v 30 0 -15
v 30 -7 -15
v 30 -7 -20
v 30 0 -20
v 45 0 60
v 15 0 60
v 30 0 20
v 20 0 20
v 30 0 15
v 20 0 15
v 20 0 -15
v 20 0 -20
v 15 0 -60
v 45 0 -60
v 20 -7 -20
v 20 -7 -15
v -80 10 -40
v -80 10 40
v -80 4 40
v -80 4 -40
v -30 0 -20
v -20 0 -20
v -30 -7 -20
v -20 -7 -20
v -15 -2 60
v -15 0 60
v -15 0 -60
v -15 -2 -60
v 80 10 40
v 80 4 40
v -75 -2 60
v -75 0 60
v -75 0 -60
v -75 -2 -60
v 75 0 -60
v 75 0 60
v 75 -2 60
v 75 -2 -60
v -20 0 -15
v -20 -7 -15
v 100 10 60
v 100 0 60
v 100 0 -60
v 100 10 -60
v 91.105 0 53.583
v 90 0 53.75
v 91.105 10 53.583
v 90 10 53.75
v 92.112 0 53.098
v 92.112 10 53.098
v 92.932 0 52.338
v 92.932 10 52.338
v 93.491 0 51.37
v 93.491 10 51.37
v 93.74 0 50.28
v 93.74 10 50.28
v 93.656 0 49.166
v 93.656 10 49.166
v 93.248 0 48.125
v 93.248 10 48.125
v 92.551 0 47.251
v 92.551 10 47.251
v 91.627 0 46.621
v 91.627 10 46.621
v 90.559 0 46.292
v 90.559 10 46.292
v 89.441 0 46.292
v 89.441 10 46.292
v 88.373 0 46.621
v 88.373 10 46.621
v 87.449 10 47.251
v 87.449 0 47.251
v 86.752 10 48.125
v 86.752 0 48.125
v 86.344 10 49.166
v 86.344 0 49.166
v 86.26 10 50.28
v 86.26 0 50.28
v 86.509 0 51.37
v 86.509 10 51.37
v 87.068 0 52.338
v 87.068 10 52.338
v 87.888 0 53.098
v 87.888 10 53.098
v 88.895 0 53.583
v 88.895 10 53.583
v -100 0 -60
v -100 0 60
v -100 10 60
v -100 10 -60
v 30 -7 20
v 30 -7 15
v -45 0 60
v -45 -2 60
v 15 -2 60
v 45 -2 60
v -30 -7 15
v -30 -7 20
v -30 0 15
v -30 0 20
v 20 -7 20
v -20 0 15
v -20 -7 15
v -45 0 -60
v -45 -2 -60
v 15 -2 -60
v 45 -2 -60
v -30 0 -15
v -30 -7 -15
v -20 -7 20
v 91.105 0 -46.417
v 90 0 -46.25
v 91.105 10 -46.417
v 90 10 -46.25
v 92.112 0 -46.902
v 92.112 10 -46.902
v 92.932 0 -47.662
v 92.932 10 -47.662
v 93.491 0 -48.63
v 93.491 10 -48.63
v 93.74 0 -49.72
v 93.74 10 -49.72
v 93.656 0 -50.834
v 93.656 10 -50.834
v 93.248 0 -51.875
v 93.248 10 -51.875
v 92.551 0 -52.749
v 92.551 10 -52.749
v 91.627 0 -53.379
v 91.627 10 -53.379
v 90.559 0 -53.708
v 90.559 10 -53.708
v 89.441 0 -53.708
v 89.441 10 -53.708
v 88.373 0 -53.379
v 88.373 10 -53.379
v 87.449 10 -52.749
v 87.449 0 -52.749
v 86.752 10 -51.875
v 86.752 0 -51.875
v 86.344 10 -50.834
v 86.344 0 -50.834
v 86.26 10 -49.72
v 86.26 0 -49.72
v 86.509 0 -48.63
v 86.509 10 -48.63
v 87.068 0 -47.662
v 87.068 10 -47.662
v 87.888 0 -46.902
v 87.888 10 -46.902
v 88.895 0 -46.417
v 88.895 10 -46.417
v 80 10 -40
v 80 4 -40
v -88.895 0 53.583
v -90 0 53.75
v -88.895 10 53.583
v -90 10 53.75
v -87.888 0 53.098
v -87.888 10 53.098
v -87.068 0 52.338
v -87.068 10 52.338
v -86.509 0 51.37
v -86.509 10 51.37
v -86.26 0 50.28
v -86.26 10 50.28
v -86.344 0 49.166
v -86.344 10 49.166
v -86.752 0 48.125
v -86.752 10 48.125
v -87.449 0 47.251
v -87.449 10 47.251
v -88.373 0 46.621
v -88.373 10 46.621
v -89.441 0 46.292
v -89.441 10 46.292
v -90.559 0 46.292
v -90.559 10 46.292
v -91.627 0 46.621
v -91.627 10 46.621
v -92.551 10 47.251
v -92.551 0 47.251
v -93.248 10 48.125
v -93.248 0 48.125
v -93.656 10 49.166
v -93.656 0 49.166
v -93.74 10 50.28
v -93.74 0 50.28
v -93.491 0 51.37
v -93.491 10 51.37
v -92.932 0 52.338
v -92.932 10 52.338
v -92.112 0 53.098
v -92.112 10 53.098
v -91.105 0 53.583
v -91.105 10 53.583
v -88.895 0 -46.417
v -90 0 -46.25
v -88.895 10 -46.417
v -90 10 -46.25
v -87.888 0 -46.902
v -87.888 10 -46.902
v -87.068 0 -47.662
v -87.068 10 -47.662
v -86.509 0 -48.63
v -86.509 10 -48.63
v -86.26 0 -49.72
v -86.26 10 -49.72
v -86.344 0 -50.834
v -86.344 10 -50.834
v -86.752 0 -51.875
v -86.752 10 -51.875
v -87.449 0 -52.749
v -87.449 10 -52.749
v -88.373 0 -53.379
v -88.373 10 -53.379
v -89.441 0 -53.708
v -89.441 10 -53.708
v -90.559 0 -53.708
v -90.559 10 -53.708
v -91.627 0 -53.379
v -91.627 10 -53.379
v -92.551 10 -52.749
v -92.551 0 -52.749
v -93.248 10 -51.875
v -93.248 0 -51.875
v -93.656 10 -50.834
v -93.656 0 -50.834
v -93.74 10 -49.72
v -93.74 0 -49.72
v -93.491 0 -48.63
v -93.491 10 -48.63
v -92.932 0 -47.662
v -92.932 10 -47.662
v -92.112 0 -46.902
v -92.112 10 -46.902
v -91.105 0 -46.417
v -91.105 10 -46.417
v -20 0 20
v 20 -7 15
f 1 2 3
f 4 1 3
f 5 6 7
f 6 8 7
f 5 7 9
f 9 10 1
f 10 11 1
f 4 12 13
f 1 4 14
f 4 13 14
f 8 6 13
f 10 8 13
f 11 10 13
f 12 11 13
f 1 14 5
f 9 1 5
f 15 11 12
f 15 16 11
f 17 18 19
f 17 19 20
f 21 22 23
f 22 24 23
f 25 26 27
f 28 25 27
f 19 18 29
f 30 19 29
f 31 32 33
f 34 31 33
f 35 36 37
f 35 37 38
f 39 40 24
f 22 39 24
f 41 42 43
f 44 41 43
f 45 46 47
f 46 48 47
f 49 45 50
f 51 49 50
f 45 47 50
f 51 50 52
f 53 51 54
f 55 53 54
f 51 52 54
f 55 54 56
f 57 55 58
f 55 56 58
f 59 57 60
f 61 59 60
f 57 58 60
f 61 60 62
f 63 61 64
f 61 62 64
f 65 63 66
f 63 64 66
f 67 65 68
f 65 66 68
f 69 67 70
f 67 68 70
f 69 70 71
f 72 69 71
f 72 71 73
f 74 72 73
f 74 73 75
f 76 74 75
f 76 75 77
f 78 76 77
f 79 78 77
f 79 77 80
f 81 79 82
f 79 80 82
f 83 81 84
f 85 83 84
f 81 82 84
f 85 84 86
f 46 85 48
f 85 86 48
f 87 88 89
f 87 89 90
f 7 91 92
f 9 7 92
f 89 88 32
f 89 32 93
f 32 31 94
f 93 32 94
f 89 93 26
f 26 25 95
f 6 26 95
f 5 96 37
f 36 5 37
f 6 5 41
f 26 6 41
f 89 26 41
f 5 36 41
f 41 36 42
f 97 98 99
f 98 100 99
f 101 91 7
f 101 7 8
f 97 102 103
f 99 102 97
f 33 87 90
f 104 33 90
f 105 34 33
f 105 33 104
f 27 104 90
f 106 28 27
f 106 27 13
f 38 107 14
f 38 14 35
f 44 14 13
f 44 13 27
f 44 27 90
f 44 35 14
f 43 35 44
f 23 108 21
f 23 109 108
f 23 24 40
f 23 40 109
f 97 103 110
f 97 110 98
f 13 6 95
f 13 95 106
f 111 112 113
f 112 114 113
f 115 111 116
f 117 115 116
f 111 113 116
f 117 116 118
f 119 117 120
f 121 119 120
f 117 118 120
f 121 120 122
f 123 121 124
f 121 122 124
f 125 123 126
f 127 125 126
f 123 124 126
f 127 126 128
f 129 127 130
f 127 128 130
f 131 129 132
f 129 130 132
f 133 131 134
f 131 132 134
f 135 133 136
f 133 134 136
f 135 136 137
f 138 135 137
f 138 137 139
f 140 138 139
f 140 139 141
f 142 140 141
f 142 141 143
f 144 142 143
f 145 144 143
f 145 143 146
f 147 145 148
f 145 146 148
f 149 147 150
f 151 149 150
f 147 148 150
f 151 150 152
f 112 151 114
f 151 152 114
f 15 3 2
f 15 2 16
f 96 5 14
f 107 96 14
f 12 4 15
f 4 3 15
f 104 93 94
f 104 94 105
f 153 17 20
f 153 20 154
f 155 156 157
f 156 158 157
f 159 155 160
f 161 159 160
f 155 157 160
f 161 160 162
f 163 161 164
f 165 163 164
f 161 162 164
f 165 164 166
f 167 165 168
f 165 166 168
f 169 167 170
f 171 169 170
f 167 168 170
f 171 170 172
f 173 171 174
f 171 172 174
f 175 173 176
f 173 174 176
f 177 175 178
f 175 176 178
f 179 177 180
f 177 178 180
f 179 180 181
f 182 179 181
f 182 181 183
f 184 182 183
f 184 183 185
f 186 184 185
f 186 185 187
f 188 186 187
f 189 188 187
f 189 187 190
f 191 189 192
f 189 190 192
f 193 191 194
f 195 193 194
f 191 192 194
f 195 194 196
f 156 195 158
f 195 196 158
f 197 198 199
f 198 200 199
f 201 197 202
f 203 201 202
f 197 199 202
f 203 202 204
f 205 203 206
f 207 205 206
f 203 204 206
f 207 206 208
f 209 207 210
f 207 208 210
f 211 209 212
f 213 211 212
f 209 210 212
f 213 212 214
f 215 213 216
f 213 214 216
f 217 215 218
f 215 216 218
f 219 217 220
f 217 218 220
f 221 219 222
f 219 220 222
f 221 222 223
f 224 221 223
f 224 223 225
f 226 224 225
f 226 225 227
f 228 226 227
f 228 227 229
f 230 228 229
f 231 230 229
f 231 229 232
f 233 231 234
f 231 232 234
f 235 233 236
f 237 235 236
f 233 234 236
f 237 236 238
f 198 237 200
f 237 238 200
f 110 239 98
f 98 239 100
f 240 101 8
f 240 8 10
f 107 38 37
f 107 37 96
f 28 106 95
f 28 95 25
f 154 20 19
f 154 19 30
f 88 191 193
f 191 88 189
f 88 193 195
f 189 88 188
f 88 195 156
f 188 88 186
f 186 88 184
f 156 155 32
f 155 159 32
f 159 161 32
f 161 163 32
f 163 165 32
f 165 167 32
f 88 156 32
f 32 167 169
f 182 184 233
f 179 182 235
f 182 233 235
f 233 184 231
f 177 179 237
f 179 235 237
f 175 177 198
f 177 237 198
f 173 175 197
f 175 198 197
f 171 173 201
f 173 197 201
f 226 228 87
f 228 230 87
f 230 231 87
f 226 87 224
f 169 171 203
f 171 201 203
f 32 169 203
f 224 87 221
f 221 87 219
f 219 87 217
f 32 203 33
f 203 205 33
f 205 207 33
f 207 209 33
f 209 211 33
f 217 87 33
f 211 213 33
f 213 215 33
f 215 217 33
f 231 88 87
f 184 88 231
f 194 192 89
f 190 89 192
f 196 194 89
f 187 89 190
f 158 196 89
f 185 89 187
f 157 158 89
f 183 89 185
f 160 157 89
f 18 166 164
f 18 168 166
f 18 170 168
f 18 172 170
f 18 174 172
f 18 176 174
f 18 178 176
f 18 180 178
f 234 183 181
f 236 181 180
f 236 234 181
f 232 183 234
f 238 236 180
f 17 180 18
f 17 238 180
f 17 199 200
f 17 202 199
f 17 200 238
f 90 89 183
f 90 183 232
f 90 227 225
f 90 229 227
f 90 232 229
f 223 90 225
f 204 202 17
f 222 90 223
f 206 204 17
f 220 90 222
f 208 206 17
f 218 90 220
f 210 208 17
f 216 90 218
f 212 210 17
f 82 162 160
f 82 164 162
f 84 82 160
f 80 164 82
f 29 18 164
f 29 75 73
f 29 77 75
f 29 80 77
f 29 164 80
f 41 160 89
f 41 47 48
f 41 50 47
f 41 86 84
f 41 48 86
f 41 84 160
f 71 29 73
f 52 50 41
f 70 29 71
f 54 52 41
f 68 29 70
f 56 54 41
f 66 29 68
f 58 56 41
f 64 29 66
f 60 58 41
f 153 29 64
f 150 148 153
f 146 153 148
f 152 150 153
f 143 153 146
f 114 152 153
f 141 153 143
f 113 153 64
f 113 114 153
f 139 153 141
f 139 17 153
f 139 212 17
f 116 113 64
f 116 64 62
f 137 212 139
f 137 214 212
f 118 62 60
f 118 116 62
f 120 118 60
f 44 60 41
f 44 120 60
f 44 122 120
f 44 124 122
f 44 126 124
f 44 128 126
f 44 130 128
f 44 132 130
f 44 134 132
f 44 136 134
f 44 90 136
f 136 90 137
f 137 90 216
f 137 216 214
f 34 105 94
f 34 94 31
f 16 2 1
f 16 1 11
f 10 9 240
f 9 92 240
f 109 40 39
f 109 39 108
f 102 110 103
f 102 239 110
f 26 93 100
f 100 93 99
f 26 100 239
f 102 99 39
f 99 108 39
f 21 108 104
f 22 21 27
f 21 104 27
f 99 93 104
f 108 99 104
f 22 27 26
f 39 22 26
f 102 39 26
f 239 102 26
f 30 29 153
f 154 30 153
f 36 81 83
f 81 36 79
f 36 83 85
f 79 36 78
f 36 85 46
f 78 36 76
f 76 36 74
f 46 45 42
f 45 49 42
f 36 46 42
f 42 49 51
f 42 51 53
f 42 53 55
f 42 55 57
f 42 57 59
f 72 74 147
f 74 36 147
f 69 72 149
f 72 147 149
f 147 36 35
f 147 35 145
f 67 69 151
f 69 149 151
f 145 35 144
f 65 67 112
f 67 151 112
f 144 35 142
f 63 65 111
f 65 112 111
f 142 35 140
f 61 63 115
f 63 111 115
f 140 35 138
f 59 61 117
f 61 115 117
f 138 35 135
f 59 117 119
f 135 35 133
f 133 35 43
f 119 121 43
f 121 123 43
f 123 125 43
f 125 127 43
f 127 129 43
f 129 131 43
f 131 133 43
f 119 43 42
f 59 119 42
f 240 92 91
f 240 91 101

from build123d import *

# Parameters (mm, degrees)
SKETCH1_W             = 200
SKETCH1_H             = 120
BOSS_EXTRUDE3_DEPTH   = 10
SKETCH3_R             = 3.75
SKETCH3_W             = 160
SKETCH3_H             = 80
CUT_EXTRUDE2_DEPTH    = 6
SKETCH6_R             = 3.75
CUT_EXTRUDE4_DEPTH    = 117.773284616
SKETCH7_W             = 30
SKETCH7_H             = 120
BOSS_EXTRUDE4_DEPTH   = 2
SKETCH8_W             = 10
SKETCH8_H             = 5
BOSS_EXTRUDE5_DEPTH   = 2
BOSS_EXTRUDE5_2_DEPTH = 2
BOSS_EXTRUDE5_3_DEPTH = 2
BOSS_EXTRUDE5_4_DEPTH = 2
SKETCH10_W            = 10
SKETCH10_H            = 5
BOSS_EXTRUDE6_DEPTH   = 5


with BuildPart() as part:
    # Sketch1 → Boss-Extrude3 (new body)
    with BuildSketch(Plane(origin=(0, 0, 0), x_dir=(1, 0, 0), z_dir=(0, 1, 0))):
        Rectangle(SKETCH1_W, SKETCH1_H)
    extrude(amount=BOSS_EXTRUDE3_DEPTH)

    # Sketch3 → Cut-Extrude2 (cut)
    with BuildSketch(Plane(origin=(0, 10, 0), x_dir=(1, 0, 0), z_dir=(0, 1, 0))):
        with Locations(Location((-90, 50, 0), (0, 0, 270))):
            Circle(SKETCH3_R)
        with Locations(Location((90, -50, 0), (0, 0, 270))):
            Circle(SKETCH3_R)
        with Locations(Location((90, 50, 0), (0, 0, 270))):
            Circle(SKETCH3_R)
        with Locations(Location((-90, -50, 0), (0, 0, 270))):
            Circle(SKETCH3_R)
        Rectangle(SKETCH3_W, SKETCH3_H)
    extrude(amount=-CUT_EXTRUDE2_DEPTH, mode=Mode.SUBTRACT)

    # Sketch6 → Cut-Extrude4 (cut, through all)
    with BuildSketch(Plane(origin=(0, 4, 0), x_dir=(1, 0, 0), z_dir=(0, 1, 0))):
        with Locations(Location((-90, 50, 0), (0, 0, 270))):
            Circle(SKETCH6_R)
        with Locations(Location((90, 50, 0), (0, 0, 270))):
            Circle(SKETCH6_R)
        with Locations(Location((90, -50, 0), (0, 0, 270))):
            Circle(SKETCH6_R)
        with Locations(Location((-90, -50, 0), (0, 0, 270))):
            Circle(SKETCH6_R)
    extrude(amount=-CUT_EXTRUDE4_DEPTH, mode=Mode.SUBTRACT)

    # Sketch7 → Boss-Extrude4 (add)
    with BuildSketch(Plane(origin=(0, 0, 0), x_dir=(-1, 0, 0), z_dir=(0, -1, 0))):
        Rectangle(SKETCH7_W, SKETCH7_H)
        with Locations((60, 0)):
            Rectangle(SKETCH7_W, SKETCH7_H)
        with Locations((-60, 0)):
            Rectangle(SKETCH7_W, SKETCH7_H)
    extrude(amount=BOSS_EXTRUDE4_DEPTH)



with BuildPart() as body_2:
    # Sketch8 → Boss-Extrude5 (new body)
    with BuildSketch(Plane(origin=(0, -2, 0), x_dir=(-1, 0, 0), z_dir=(0, -1, 0))):
        with Locations((25, -17.5)):
            Rectangle(SKETCH8_W, SKETCH8_H)
    extrude(amount=-BOSS_EXTRUDE5_DEPTH)


with BuildPart() as body_3:
    # Sketch8 → Boss-Extrude5 2 (new body)
    with BuildSketch(Plane(origin=(0, -2, 0), x_dir=(-1, 0, 0), z_dir=(0, -1, 0))):
        with Locations((-25, -17.5)):
            Rectangle(SKETCH8_W, SKETCH8_H)
    extrude(amount=-BOSS_EXTRUDE5_2_DEPTH)


with BuildPart() as body_4:
    # Sketch8 → Boss-Extrude5 3 (new body)
    with BuildSketch(Plane(origin=(0, -2, 0), x_dir=(-1, 0, 0), z_dir=(0, -1, 0))):
        with Locations((-25, 17.5)):
            Rectangle(SKETCH8_W, SKETCH8_H)
    extrude(amount=-BOSS_EXTRUDE5_3_DEPTH)


with BuildPart() as body_5:
    # Sketch8 → Boss-Extrude5 4 (new body)
    with BuildSketch(Plane(origin=(0, -2, 0), x_dir=(-1, 0, 0), z_dir=(0, -1, 0))):
        with Locations((25, 17.5)):
            Rectangle(SKETCH8_W, SKETCH8_H)
    extrude(amount=-BOSS_EXTRUDE5_4_DEPTH)


with BuildPart() as part_1:
    add(part.part)

    add(body_2.part)  # Boss-Extrude6 merges body 2

    add(body_3.part)  # Boss-Extrude6 merges body 3

    add(body_4.part)  # Boss-Extrude6 merges body 4

    add(body_5.part)  # Boss-Extrude6 merges body 5
    # Sketch10 → Boss-Extrude6 (add)
    with BuildSketch(Plane(origin=(0, -2, 0), x_dir=(-1, 0, 0), z_dir=(0, -1, 0))):
        with Locations((25, -17.5)):
            Rectangle(SKETCH10_W, SKETCH10_H)
        with Locations((25, 17.5)):
            Rectangle(SKETCH10_W, SKETCH10_H)
        with Locations((-25, 17.5)):
            Rectangle(SKETCH10_W, SKETCH10_H)
        with Locations((-25, -17.5)):
            Rectangle(SKETCH10_W, SKETCH10_H)
    extrude(amount=BOSS_EXTRUDE6_DEPTH)


solid = part_1.part
